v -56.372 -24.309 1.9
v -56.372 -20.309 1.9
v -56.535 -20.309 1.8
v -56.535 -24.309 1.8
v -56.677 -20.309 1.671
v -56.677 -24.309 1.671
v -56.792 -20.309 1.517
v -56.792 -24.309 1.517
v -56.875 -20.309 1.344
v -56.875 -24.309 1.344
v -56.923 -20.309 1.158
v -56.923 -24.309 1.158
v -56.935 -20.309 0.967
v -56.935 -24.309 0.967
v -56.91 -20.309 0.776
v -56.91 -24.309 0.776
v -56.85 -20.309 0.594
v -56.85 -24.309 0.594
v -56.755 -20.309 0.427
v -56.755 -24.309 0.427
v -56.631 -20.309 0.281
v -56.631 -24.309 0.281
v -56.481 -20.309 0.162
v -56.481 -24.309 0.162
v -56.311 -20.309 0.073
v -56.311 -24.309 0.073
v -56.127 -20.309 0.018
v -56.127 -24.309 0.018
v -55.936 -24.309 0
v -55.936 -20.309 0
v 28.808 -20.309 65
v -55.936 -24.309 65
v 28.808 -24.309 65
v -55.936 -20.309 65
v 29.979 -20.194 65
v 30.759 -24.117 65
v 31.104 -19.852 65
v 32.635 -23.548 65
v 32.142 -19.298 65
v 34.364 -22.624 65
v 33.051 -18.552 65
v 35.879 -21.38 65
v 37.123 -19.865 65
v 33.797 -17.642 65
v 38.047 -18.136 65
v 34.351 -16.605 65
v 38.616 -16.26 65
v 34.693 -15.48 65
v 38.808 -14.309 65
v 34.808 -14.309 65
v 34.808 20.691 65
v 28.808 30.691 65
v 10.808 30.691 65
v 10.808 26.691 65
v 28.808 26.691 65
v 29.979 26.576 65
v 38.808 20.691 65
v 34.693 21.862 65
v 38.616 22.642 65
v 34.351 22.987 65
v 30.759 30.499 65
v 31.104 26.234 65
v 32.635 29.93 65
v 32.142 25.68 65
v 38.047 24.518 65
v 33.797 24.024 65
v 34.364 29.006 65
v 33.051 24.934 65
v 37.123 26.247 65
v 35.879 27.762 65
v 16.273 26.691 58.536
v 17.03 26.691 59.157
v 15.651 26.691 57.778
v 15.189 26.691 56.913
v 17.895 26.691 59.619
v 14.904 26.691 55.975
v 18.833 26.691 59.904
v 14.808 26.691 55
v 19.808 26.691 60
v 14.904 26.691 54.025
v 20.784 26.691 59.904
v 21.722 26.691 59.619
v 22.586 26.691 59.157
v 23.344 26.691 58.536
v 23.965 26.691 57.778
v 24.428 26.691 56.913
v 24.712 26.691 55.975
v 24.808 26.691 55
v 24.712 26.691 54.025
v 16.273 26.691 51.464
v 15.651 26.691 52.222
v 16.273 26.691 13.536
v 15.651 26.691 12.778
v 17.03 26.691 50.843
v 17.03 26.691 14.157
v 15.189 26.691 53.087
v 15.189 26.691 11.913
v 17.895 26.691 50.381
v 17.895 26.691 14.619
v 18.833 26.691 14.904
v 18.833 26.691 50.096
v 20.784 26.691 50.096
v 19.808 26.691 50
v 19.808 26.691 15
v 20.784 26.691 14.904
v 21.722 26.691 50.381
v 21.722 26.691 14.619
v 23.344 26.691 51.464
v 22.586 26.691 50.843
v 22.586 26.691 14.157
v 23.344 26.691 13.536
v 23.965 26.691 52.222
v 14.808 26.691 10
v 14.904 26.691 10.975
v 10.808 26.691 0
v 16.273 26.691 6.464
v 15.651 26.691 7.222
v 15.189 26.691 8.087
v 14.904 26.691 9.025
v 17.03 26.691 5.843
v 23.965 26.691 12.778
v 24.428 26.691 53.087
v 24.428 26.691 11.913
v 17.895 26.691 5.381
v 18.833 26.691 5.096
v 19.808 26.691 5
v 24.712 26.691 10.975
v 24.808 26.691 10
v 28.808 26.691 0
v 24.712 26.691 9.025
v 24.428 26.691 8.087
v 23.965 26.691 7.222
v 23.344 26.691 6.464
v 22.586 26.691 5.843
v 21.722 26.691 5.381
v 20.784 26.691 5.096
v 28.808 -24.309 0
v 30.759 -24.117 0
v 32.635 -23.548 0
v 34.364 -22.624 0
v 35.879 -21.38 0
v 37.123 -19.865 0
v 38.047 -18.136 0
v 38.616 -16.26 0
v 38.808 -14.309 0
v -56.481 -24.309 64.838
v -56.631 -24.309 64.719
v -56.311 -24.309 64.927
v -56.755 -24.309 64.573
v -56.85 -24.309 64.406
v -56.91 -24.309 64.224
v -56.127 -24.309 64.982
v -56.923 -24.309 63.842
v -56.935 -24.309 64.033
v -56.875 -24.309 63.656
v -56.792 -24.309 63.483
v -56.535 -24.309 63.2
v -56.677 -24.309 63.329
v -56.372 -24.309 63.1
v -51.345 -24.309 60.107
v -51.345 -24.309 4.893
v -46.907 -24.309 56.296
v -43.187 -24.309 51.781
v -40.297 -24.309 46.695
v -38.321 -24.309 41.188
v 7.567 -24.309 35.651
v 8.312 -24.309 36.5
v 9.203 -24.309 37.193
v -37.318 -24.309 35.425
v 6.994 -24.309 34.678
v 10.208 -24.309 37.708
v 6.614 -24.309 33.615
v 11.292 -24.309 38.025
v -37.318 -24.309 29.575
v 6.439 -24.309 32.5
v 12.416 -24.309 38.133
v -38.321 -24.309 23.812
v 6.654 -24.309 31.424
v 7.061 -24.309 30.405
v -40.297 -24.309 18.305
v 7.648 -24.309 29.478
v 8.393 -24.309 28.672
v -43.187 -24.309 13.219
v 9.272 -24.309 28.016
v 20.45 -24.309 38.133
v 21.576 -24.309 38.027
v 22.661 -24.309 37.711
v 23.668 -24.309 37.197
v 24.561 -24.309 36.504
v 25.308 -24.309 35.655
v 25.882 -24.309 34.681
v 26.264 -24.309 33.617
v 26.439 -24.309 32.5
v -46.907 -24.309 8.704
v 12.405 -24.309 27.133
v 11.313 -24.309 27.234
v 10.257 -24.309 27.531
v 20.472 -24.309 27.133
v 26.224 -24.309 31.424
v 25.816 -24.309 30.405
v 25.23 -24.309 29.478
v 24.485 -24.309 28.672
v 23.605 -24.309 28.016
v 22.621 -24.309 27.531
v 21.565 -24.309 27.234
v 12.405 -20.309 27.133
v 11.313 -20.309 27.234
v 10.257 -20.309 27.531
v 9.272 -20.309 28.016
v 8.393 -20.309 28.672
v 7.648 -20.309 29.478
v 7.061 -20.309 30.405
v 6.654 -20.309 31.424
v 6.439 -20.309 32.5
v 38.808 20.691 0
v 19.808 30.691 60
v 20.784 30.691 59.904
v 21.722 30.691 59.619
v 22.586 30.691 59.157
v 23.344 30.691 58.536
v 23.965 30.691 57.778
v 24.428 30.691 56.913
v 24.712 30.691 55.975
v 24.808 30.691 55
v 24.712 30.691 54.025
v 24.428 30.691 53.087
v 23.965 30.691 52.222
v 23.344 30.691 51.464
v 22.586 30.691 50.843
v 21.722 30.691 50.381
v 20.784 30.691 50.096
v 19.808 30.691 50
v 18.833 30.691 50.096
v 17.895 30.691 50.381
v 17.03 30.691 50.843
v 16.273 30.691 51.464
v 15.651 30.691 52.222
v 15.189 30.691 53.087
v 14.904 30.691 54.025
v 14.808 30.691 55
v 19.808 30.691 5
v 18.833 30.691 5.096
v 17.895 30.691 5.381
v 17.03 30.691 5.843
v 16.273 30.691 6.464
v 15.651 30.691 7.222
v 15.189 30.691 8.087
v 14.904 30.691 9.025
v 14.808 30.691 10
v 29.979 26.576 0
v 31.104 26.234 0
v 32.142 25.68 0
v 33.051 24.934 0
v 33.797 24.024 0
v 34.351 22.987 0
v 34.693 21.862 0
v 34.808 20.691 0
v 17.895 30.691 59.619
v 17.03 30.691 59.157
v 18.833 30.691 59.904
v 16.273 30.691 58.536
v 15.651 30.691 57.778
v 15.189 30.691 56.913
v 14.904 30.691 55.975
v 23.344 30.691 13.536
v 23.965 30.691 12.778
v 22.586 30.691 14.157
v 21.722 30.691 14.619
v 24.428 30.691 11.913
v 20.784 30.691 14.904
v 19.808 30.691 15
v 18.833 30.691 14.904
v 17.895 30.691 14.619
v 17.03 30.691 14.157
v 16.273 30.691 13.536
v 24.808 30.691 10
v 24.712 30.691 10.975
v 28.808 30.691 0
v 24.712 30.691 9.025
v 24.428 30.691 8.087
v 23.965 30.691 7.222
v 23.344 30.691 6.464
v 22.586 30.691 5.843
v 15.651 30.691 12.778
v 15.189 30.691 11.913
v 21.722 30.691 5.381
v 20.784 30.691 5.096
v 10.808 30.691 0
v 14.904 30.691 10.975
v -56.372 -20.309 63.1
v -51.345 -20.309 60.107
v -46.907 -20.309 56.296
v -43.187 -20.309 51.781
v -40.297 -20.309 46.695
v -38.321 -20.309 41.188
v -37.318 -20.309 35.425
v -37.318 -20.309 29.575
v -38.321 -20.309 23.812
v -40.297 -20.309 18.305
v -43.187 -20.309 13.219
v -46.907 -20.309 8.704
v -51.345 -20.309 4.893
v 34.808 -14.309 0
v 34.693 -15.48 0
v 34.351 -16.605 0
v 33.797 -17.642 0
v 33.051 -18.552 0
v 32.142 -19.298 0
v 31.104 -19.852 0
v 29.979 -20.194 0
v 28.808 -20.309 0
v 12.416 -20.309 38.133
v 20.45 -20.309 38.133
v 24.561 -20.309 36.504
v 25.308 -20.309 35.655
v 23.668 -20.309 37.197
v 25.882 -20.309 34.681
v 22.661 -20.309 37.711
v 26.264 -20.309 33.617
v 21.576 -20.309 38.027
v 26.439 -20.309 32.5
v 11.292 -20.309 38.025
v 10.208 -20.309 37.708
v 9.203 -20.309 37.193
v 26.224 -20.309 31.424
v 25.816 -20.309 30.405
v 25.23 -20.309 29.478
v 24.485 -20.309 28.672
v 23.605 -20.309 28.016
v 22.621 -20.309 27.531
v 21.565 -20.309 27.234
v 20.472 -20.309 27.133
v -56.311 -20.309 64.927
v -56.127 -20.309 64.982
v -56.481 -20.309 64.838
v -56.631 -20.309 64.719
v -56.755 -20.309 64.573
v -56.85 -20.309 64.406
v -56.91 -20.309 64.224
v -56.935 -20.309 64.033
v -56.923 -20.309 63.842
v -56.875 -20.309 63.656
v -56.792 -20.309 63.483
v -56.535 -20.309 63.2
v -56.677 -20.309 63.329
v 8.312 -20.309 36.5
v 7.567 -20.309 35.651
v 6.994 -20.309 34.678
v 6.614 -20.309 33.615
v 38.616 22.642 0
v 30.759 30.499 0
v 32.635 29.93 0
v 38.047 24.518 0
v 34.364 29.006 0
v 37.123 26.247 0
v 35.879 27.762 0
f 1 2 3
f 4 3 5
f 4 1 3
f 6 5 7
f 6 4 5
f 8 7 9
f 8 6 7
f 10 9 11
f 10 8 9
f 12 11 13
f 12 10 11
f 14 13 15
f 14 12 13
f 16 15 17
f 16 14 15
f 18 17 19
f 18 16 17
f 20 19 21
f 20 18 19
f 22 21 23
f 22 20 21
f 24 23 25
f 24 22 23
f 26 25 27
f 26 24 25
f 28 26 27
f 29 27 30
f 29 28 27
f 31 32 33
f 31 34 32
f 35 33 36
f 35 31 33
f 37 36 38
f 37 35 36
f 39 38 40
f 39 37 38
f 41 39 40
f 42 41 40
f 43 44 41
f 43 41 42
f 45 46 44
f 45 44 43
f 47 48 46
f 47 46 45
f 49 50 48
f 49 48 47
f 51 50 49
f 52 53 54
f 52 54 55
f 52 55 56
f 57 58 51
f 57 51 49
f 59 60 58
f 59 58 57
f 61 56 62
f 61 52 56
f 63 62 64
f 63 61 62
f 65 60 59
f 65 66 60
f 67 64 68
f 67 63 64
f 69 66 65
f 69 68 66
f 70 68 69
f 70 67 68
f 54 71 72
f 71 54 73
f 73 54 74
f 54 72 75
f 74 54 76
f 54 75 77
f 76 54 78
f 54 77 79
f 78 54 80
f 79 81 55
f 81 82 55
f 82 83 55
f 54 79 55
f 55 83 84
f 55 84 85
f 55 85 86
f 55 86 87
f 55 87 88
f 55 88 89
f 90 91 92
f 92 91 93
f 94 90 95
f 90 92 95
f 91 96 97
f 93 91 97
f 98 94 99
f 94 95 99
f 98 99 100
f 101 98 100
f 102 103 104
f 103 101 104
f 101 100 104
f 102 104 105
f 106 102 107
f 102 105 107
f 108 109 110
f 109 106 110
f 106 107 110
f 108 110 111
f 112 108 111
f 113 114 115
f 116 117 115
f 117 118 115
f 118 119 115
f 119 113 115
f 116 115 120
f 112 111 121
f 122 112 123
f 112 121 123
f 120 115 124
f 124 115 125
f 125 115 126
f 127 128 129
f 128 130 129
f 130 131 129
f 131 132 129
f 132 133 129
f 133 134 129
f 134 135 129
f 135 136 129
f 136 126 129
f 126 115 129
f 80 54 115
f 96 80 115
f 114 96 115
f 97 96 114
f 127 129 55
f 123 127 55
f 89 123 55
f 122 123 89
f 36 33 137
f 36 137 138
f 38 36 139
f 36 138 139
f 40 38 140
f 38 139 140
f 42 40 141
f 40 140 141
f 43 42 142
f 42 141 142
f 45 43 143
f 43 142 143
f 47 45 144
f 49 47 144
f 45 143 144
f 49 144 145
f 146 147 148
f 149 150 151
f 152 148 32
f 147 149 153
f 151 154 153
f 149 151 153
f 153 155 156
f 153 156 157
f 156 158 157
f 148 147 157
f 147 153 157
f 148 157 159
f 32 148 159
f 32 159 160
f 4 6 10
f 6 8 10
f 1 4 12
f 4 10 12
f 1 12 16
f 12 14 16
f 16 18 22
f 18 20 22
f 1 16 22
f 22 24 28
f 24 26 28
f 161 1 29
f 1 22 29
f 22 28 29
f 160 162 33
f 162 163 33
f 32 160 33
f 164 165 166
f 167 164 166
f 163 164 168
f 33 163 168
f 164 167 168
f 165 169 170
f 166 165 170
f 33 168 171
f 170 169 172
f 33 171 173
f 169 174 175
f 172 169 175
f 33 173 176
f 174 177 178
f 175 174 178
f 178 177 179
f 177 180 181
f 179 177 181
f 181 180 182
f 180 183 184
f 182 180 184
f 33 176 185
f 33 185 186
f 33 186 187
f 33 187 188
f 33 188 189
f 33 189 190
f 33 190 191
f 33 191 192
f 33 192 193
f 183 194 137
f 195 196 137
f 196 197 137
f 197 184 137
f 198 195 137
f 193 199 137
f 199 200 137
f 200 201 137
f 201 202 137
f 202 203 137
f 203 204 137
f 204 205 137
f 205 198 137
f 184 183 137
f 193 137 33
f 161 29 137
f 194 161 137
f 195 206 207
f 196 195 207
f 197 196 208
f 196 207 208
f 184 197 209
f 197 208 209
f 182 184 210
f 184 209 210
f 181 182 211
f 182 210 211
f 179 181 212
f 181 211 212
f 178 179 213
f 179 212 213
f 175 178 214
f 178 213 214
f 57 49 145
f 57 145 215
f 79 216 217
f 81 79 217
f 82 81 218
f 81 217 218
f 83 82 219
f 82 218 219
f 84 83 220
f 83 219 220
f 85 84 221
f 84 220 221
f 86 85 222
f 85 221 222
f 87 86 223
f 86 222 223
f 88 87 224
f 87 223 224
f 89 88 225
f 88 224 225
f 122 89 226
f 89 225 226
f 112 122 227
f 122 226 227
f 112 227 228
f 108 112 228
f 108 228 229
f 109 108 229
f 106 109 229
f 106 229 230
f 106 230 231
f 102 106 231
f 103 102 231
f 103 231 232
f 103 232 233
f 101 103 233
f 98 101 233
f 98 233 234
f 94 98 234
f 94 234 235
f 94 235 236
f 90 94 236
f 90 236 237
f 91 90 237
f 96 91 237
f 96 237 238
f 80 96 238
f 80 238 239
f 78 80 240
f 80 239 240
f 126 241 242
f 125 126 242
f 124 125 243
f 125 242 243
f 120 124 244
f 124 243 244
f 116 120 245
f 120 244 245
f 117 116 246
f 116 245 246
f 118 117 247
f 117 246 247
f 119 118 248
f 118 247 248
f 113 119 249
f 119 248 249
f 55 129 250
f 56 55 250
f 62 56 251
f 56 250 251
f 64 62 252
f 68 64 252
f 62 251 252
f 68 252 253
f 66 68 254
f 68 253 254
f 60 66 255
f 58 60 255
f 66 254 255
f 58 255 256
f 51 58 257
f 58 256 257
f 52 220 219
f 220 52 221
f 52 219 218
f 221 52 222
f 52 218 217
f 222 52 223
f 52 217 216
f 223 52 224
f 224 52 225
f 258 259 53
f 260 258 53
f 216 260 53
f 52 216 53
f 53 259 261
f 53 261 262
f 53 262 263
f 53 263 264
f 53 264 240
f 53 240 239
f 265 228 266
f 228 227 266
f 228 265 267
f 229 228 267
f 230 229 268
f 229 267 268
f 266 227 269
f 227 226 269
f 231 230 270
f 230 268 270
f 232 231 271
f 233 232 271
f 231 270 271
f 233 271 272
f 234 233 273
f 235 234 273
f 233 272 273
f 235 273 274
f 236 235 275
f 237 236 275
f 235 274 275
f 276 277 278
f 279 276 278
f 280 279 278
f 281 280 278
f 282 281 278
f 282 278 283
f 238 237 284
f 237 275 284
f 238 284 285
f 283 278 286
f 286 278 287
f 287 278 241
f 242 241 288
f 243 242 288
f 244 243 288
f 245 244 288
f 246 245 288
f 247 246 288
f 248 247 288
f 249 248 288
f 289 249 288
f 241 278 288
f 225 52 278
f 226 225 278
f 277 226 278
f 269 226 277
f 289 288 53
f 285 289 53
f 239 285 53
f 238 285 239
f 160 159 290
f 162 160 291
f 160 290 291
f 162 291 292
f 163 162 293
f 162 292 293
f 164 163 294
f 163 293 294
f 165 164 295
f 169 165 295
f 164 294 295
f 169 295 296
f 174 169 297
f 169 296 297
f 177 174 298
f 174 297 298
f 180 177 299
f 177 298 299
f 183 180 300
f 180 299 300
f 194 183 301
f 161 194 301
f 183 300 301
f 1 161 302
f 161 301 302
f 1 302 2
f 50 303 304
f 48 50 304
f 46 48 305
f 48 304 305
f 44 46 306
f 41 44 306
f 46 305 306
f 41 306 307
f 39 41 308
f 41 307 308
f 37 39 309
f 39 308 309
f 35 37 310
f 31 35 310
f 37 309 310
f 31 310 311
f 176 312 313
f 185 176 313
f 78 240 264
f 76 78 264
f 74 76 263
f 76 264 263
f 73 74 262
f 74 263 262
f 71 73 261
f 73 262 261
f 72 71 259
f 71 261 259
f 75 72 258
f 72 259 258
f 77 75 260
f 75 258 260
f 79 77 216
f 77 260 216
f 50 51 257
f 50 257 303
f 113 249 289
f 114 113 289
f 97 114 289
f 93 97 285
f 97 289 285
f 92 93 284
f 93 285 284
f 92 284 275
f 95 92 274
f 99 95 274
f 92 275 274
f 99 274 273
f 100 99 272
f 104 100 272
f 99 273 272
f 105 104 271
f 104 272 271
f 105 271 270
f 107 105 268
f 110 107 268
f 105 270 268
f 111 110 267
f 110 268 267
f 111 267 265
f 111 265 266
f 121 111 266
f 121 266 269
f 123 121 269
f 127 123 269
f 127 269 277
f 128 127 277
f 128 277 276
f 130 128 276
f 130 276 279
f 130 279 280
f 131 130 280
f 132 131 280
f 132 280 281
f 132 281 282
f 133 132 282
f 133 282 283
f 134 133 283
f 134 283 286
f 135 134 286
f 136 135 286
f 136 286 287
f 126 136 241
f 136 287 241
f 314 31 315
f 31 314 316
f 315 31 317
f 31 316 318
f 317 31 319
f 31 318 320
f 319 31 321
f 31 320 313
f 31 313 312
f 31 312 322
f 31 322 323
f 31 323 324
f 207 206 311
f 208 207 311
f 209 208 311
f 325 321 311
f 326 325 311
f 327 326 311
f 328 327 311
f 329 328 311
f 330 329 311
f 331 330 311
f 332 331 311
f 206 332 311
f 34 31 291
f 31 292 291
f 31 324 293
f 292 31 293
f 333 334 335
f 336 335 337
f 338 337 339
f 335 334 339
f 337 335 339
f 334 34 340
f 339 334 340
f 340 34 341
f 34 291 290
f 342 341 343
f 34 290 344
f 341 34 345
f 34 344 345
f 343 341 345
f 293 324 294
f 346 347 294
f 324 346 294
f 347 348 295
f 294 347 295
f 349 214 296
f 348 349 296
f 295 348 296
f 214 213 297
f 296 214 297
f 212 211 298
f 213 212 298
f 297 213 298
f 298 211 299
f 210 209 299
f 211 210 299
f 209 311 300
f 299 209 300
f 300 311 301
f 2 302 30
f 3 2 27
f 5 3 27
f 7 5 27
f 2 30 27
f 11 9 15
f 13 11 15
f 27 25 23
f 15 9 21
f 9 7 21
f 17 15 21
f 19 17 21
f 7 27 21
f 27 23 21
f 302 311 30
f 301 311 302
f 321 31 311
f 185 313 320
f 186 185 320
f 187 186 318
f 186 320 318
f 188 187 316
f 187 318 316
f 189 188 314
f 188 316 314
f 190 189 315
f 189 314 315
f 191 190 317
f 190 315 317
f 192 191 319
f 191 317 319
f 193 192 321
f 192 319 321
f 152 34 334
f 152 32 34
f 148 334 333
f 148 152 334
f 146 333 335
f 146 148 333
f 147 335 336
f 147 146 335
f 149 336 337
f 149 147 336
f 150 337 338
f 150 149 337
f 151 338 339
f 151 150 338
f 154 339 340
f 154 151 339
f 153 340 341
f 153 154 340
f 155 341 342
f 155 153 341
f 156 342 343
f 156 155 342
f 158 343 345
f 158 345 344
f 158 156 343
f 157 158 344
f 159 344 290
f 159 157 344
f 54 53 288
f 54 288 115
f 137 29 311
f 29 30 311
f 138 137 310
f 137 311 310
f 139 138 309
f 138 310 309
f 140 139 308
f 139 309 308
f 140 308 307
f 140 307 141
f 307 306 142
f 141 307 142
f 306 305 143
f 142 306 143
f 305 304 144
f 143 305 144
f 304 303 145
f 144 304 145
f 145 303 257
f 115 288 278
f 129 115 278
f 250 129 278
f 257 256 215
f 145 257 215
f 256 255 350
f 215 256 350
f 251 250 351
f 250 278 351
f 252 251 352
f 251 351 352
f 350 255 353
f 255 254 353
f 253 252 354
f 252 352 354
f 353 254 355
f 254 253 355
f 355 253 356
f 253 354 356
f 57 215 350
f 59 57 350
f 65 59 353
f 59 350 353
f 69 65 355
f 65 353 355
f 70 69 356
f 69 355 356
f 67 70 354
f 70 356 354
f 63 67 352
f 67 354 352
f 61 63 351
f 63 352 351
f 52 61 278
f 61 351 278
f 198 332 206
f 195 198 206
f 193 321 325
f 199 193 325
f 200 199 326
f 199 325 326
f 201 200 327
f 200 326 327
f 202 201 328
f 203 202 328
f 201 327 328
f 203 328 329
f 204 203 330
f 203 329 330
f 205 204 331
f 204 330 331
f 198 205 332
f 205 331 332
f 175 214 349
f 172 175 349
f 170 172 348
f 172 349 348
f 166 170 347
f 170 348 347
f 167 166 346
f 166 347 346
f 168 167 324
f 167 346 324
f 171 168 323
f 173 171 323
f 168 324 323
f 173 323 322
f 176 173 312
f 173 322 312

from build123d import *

# Parameters (mm, degrees)
F1_DEPTH = 65
F3_DEPTH = 25
F5_DEPTH = 25
F6_DEPTH = 11
F7_R     = 1
F8_R     = 1


with BuildPart() as f1:
    # F0 (on Top) → F1 (new body)
    with BuildSketch(Plane.XY):
        with BuildLine():
            Line((28.8081228733, 30.691023916), (10.8081228733, 30.691023916))
            Line((10.8081228733, 30.691023916), (10.8081228733, 26.691023916))
            Line((10.8081228733, 26.691023916), (28.8081228733, 26.691023916))
            ThreePointArc((28.8081228733, 26.691023916), (33.0507635604, 24.9336646031), (34.8081228733, 20.691023916))
            Line((34.8081228733, 20.691023916), (34.8081228733, 19.2851312459))
            Line((34.8081228733, 19.2851312459), (34.8081228733, -14.308976084))
            ThreePointArc((34.8081228733, -14.308976084), (33.0507635604, -18.5516167711), (28.8081228733, -20.308976084))
            Line((28.8081228733, -20.308976084), (-71.1918771267, -20.308976084))
            Line((-71.1918771267, -20.308976084), (-71.1918771267, -22.308976084))
            Line((-71.1918771267, -22.308976084), (-71.1918771267, -24.308976084))
            Line((-71.1918771267, -24.308976084), (28.8081228733, -24.308976084))
            ThreePointArc((28.8081228733, -24.308976084), (35.8791906852, -21.3800438959), (38.8081228733, -14.308976084))
            Line((38.8081228733, -14.308976084), (38.8081228733, 20.691023916))
            ThreePointArc((38.8081228733, 20.691023916), (35.8791906852, 27.7620917279), (28.8081228733, 30.691023916))
        make_face()
    extrude(amount=F1_DEPTH)

    # F2 (on face) → F3 (cut)
    with BuildSketch(Plane(origin=(0, 30.691023916, 0), x_dir=(-1, 0, 0), z_dir=(0, 1, 0))):
        with BuildLine():
            ThreePointArc((-14.8081228733, 55), (-16.2725889674, 58.5355339059), (-19.8081228733, 60))
            ThreePointArc((-19.8081228733, 60), (-23.3436567792, 51.4644660941), (-14.8081228733, 55))
        make_face()
        with BuildLine():
            ThreePointArc((-14.8081228733, 10), (-23.3436567792, 13.5355339059), (-19.8081228733, 5))
            ThreePointArc((-19.8081228733, 5), (-16.2725889674, 6.4644660941), (-14.8081228733, 10))
        make_face()
    extrude(amount=-F3_DEPTH, mode=Mode.SUBTRACT)

    # F4 (on face) → F5 (cut)
    with BuildSketch(Plane(origin=(0, -20.308976084, 0), x_dir=(-1, 0, 0), z_dir=(0, 1, 0))):
        with BuildLine():
            ThreePointArc((-6.4388471842, 32.5), (-8.3123065892, 36.4995007653), (-12.4155679156, 38.1332397291))
            Line((-12.4155679156, 38.1332397291), (-20.4500670994, 38.1332397291))
            ThreePointArc((-20.4500670994, 38.1332397291), (-24.5609939033, 36.5036265326), (-26.4388471842, 32.5))
            ThreePointArc((-26.4388471842, 32.5), (-24.4848723268, 28.6723295991), (-20.4723568049, 27.1332397291))
            Line((-20.4723568049, 27.1332397291), (-12.4053375634, 27.1332397291))
            ThreePointArc((-12.4053375634, 27.1332397291), (-8.3928220416, 28.6723295991), (-6.4388471842, 32.5))
        make_face()
    extrude(amount=-F5_DEPTH, mode=Mode.SUBTRACT)

    # F4 (on face) → F6 (cut)
    with BuildSketch(Plane(origin=(0, -20.308976084, 0), x_dir=(-1, 0, 0), z_dir=(0, 1, 0))):
        with BuildLine():
            ThreePointArc((61.204384949, 0), (91.3961497684, 5.1542989298), (105.1918771267, 32.5))
            ThreePointArc((105.1918771267, 32.5), (91.3961497684, 59.8457010702), (61.204384949, 65))
            Line((61.204384949, 65), (71.1918771267, 65))
            Line((71.1918771267, 65), (71.1918771267, 0))
            Line((71.1918771267, 0), (61.204384949, 0))
        make_face()
        with BuildLine():
            Line((71.1918771267, 65), (61.204384949, 65))
            ThreePointArc((61.204384949, 65), (37.1918771267, 32.5), (61.204384949, 0))
            Line((61.204384949, 0), (71.1918771267, 0))
            Line((71.1918771267, 0), (71.1918771267, 65))
        make_face()
    extrude(amount=-F6_DEPTH, mode=Mode.SUBTRACT)

    # F7
    f7_edges = [f1.edges().sort_by_distance(p)[0] for p in [
        (-61.204385, -22.308976, 65),
    ]]
    fillet(f7_edges, radius=F7_R)

    # F8
    f8_edges = [f1.edges().sort_by_distance(p)[0] for p in [
        (-61.204385, -22.308976, 0),
    ]]
    fillet(f8_edges, radius=F8_R)


solid = f1.part
